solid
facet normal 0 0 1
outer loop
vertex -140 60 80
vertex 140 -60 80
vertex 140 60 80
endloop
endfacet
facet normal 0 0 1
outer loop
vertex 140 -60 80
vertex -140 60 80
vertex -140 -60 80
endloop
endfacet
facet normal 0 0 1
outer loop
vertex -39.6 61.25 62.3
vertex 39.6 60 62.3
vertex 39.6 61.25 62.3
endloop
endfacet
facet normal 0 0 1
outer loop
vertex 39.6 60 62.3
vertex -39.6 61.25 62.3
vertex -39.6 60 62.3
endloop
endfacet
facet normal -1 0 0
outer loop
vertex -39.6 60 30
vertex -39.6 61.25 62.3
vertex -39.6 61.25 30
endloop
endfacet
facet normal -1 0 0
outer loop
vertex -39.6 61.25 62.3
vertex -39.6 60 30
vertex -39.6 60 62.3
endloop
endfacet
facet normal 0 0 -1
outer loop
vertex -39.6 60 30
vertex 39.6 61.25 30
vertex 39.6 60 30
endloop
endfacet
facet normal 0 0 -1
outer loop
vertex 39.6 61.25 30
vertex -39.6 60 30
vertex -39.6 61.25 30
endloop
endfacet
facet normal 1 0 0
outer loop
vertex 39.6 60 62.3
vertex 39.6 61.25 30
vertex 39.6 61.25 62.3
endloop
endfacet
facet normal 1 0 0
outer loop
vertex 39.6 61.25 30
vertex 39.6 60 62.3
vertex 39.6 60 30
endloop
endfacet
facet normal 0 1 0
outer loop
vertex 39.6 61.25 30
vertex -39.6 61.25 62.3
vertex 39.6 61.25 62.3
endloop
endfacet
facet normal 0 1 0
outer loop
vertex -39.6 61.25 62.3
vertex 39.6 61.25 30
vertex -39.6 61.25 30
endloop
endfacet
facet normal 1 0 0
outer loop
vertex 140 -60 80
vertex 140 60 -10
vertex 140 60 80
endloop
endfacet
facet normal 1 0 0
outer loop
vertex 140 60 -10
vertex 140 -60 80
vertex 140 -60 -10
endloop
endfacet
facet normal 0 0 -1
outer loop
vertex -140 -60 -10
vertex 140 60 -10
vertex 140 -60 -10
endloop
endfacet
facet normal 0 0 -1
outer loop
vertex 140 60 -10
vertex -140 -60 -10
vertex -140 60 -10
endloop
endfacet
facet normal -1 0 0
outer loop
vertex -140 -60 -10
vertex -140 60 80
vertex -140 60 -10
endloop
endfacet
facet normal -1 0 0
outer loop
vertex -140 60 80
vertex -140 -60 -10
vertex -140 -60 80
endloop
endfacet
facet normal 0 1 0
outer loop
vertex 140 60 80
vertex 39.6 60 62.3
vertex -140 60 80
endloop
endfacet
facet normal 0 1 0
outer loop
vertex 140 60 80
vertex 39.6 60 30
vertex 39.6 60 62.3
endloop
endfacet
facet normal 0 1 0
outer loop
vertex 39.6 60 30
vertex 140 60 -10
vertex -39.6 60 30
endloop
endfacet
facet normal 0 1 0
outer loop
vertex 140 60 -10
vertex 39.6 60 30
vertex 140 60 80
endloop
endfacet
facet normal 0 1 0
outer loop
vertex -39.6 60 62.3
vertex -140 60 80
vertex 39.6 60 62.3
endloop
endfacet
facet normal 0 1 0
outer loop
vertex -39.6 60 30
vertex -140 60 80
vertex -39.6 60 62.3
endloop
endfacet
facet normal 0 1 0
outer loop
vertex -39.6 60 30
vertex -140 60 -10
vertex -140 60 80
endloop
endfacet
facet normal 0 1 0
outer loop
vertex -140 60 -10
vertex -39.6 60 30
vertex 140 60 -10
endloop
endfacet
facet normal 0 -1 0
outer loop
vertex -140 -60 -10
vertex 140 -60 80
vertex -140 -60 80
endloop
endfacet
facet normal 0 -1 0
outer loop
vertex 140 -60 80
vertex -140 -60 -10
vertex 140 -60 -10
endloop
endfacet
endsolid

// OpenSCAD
// All measurements in mm and stated as L x W x D
// Yun = 73 x 53 x ?
yun_l = 73;
yun_w = 53;
yun_h = 10;

// SSR + heatsink = 100 x 55 x 67
ssr_l = 100;
ssr_w = 55;
ssr_h = 67;

// PSU = 105 x 50 x 18
psu_l = 105;
psu_w = 50;
psu_h = 18;

// LED = 12mm diameter
led_d = 12;
led_h = 15;

// RFID = 62 x 82 x ?
rfid_l = 62;
rfid_w = 82;
rfid_h = 5;

// IEC inlet/outlet/fuse = 32.5 x 79.2 (hole size for 1.5mm panel thickness) x 32.3 depth
iec_l = 32.5;
iec_w = 79.2;
iec_h = 32.3;

// LCD = 37 x 116 x ?
lcd_l = 37;
lcd_w = 116;
lcd_h = 10;

case_l = 280;
case_w = 120;
case_h = 90;

screw_r = 1.5;

// stuff on the base
translate([-100,0,0]) rotate([0,0,90]) ssr();
translate([0,-20,0]) psu();
translate([0,45,30])
    rotate([0,0,90]) iec();
translate([100,00,0]) rotate([0,0,90]) yun();

// stuff on the lid
translate([0,0,80])
{
translate([-25,-30,0]) led();
translate([25,-30,0]) led();
translate([100,0,0]) rfid();
translate([0,0,0]) rotate([0,0,90]) lcd();
}

case();

/*
projection()
difference()
{
    base();
    translate([-base_w/2 + 25,0,0])
        ssr();
    translate([-base_w/2 + 25 + 50,0,0])
        ac_dc();
    translate([-base_w/2 + 25 + 50 + 60,0,0])
        arduino();
    translate([-base_w/2 + 25 + 50 + 60 + 50,0,0])
        temp();
}
//arduino();
//temp();
*/

module psu()
{
    translate([0,0,psu_h/2])
        cube([psu_l, psu_w, psu_h], center=true);
    /*
    translate([ac_dc_w/2,ac_dc_h/2,0])
        cylinder(r=screw_r,h=th*2,center=true);
    translate([-ac_dc_w/2,ac_dc_h/2,0])
        cylinder(r=screw_r,h=th*2,center=true);
    translate([ac_dc_w/2,-ac_dc_h/2,0])
        cylinder(r=screw_r,h=th*2,center=true);
    translate([-ac_dc_w/2,-ac_dc_h/2,0])
        cylinder(r=screw_r,h=th*2,center=true);
    */
}
module yun()
{
    translate([0,0,yun_h/2])
    cube([yun_l, yun_w, yun_h], center=true);
}

module ssr()
{
    translate([0,0,ssr_h/2])
    cube([ssr_l, ssr_w, ssr_h], center=true);
}

module lcd()
{
    translate([0,0,-lcd_h/2])
    cube([lcd_l, lcd_w, lcd_h], center=true);
}

module rfid()
{
    translate([0,0,-rfid_h/2])
    cube([rfid_l, rfid_w, rfid_h], center=true);
}

module iec()
{
    translate([0,0,iec_h/2])
    cube([iec_l, iec_w, iec_h], center=true);
}

module led()
{
    translate([0,0,-led_h/2])
    cylinder(r=led_d/2, h=led_h, center=true);
}

module case()
{
    color("red", 0.2)
        translate([0,0,case_h/2-10])
        cube([case_l, case_w, case_h], center=true);
}
